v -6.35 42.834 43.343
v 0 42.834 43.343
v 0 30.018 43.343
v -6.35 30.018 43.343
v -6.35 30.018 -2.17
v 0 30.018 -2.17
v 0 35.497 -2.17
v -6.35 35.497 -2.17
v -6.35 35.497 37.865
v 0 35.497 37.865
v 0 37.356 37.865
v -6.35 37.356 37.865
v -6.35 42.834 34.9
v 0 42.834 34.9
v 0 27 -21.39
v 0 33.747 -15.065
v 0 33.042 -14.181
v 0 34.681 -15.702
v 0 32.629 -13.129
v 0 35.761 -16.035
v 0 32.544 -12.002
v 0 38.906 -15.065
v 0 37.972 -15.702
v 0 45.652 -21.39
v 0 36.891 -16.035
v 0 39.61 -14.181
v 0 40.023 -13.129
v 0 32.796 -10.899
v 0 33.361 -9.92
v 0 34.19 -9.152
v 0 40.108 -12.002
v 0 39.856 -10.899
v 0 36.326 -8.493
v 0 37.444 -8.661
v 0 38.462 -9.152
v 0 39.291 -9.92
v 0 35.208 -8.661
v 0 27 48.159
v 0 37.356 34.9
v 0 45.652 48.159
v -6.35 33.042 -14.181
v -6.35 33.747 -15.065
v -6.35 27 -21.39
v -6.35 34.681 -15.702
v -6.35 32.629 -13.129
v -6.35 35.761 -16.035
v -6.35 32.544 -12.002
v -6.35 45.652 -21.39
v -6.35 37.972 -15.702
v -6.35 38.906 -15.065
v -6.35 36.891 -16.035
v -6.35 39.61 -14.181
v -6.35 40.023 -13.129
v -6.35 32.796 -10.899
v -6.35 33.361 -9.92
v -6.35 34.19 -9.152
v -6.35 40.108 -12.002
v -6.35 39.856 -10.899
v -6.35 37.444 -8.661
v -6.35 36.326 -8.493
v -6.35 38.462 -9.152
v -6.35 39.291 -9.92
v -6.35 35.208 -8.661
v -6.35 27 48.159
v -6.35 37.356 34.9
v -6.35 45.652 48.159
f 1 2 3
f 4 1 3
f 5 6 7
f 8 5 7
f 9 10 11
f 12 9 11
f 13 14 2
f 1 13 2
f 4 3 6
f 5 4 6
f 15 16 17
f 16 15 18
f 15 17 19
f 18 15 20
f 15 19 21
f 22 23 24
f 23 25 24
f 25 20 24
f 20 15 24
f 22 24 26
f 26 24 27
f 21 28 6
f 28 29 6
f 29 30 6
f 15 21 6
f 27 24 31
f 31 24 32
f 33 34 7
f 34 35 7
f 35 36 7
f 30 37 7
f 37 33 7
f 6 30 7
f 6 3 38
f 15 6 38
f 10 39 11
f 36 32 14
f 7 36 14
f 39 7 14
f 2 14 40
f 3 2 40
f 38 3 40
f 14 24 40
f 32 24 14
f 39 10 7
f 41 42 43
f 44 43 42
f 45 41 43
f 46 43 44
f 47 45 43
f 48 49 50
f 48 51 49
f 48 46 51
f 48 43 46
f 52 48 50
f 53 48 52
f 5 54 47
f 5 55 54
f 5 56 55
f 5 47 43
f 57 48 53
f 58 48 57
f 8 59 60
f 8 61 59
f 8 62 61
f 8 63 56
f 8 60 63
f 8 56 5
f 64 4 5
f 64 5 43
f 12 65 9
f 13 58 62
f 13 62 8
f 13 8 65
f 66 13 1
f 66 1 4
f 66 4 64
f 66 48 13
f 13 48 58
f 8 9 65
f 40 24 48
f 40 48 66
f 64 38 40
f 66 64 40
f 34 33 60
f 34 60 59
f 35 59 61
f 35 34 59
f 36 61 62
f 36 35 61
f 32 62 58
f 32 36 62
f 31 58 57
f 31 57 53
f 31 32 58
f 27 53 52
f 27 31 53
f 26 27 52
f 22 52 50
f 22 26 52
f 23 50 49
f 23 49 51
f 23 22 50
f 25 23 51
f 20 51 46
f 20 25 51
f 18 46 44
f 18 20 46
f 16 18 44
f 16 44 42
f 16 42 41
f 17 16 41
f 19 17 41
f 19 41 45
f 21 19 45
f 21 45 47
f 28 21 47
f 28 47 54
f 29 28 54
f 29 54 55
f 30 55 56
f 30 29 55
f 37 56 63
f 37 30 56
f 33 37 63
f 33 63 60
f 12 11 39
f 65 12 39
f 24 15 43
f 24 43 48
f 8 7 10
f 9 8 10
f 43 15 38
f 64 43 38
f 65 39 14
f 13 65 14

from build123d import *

# Parameters (mm, degrees)
SKETCH2_W           = 69.549132125
SKETCH2_H           = 18.652417492
SKETCH2_R           = 3.792348853
BOSS_EXTRUDE1_DEPTH = 6.35


with BuildPart() as part:
    # Sketch2 → Boss-Extrude1 (new body)
    with BuildSketch(Plane.ZY):
        with Locations((13.384474921, 36.326123608)):
            Rectangle(SKETCH2_W, SKETCH2_H)
        with Locations((-12.28496421, 36.326123608)):
            Circle(SKETCH2_R, mode=Mode.SUBTRACT)
        Polygon((-2.169792441, 30.018483291), (-2.169792441, 35.496966931), (37.864979034, 35.496966931), (37.864979034, 37.355942436), (34.900155127, 37.355942436), (34.900155127, 42.834426076), (43.343462674, 42.834426076), (43.343462674, 30.018483291), (37.864979034, 30.018483291), align=None, mode=Mode.SUBTRACT)
    extrude(amount=BOSS_EXTRUDE1_DEPTH)


solid = part.part
